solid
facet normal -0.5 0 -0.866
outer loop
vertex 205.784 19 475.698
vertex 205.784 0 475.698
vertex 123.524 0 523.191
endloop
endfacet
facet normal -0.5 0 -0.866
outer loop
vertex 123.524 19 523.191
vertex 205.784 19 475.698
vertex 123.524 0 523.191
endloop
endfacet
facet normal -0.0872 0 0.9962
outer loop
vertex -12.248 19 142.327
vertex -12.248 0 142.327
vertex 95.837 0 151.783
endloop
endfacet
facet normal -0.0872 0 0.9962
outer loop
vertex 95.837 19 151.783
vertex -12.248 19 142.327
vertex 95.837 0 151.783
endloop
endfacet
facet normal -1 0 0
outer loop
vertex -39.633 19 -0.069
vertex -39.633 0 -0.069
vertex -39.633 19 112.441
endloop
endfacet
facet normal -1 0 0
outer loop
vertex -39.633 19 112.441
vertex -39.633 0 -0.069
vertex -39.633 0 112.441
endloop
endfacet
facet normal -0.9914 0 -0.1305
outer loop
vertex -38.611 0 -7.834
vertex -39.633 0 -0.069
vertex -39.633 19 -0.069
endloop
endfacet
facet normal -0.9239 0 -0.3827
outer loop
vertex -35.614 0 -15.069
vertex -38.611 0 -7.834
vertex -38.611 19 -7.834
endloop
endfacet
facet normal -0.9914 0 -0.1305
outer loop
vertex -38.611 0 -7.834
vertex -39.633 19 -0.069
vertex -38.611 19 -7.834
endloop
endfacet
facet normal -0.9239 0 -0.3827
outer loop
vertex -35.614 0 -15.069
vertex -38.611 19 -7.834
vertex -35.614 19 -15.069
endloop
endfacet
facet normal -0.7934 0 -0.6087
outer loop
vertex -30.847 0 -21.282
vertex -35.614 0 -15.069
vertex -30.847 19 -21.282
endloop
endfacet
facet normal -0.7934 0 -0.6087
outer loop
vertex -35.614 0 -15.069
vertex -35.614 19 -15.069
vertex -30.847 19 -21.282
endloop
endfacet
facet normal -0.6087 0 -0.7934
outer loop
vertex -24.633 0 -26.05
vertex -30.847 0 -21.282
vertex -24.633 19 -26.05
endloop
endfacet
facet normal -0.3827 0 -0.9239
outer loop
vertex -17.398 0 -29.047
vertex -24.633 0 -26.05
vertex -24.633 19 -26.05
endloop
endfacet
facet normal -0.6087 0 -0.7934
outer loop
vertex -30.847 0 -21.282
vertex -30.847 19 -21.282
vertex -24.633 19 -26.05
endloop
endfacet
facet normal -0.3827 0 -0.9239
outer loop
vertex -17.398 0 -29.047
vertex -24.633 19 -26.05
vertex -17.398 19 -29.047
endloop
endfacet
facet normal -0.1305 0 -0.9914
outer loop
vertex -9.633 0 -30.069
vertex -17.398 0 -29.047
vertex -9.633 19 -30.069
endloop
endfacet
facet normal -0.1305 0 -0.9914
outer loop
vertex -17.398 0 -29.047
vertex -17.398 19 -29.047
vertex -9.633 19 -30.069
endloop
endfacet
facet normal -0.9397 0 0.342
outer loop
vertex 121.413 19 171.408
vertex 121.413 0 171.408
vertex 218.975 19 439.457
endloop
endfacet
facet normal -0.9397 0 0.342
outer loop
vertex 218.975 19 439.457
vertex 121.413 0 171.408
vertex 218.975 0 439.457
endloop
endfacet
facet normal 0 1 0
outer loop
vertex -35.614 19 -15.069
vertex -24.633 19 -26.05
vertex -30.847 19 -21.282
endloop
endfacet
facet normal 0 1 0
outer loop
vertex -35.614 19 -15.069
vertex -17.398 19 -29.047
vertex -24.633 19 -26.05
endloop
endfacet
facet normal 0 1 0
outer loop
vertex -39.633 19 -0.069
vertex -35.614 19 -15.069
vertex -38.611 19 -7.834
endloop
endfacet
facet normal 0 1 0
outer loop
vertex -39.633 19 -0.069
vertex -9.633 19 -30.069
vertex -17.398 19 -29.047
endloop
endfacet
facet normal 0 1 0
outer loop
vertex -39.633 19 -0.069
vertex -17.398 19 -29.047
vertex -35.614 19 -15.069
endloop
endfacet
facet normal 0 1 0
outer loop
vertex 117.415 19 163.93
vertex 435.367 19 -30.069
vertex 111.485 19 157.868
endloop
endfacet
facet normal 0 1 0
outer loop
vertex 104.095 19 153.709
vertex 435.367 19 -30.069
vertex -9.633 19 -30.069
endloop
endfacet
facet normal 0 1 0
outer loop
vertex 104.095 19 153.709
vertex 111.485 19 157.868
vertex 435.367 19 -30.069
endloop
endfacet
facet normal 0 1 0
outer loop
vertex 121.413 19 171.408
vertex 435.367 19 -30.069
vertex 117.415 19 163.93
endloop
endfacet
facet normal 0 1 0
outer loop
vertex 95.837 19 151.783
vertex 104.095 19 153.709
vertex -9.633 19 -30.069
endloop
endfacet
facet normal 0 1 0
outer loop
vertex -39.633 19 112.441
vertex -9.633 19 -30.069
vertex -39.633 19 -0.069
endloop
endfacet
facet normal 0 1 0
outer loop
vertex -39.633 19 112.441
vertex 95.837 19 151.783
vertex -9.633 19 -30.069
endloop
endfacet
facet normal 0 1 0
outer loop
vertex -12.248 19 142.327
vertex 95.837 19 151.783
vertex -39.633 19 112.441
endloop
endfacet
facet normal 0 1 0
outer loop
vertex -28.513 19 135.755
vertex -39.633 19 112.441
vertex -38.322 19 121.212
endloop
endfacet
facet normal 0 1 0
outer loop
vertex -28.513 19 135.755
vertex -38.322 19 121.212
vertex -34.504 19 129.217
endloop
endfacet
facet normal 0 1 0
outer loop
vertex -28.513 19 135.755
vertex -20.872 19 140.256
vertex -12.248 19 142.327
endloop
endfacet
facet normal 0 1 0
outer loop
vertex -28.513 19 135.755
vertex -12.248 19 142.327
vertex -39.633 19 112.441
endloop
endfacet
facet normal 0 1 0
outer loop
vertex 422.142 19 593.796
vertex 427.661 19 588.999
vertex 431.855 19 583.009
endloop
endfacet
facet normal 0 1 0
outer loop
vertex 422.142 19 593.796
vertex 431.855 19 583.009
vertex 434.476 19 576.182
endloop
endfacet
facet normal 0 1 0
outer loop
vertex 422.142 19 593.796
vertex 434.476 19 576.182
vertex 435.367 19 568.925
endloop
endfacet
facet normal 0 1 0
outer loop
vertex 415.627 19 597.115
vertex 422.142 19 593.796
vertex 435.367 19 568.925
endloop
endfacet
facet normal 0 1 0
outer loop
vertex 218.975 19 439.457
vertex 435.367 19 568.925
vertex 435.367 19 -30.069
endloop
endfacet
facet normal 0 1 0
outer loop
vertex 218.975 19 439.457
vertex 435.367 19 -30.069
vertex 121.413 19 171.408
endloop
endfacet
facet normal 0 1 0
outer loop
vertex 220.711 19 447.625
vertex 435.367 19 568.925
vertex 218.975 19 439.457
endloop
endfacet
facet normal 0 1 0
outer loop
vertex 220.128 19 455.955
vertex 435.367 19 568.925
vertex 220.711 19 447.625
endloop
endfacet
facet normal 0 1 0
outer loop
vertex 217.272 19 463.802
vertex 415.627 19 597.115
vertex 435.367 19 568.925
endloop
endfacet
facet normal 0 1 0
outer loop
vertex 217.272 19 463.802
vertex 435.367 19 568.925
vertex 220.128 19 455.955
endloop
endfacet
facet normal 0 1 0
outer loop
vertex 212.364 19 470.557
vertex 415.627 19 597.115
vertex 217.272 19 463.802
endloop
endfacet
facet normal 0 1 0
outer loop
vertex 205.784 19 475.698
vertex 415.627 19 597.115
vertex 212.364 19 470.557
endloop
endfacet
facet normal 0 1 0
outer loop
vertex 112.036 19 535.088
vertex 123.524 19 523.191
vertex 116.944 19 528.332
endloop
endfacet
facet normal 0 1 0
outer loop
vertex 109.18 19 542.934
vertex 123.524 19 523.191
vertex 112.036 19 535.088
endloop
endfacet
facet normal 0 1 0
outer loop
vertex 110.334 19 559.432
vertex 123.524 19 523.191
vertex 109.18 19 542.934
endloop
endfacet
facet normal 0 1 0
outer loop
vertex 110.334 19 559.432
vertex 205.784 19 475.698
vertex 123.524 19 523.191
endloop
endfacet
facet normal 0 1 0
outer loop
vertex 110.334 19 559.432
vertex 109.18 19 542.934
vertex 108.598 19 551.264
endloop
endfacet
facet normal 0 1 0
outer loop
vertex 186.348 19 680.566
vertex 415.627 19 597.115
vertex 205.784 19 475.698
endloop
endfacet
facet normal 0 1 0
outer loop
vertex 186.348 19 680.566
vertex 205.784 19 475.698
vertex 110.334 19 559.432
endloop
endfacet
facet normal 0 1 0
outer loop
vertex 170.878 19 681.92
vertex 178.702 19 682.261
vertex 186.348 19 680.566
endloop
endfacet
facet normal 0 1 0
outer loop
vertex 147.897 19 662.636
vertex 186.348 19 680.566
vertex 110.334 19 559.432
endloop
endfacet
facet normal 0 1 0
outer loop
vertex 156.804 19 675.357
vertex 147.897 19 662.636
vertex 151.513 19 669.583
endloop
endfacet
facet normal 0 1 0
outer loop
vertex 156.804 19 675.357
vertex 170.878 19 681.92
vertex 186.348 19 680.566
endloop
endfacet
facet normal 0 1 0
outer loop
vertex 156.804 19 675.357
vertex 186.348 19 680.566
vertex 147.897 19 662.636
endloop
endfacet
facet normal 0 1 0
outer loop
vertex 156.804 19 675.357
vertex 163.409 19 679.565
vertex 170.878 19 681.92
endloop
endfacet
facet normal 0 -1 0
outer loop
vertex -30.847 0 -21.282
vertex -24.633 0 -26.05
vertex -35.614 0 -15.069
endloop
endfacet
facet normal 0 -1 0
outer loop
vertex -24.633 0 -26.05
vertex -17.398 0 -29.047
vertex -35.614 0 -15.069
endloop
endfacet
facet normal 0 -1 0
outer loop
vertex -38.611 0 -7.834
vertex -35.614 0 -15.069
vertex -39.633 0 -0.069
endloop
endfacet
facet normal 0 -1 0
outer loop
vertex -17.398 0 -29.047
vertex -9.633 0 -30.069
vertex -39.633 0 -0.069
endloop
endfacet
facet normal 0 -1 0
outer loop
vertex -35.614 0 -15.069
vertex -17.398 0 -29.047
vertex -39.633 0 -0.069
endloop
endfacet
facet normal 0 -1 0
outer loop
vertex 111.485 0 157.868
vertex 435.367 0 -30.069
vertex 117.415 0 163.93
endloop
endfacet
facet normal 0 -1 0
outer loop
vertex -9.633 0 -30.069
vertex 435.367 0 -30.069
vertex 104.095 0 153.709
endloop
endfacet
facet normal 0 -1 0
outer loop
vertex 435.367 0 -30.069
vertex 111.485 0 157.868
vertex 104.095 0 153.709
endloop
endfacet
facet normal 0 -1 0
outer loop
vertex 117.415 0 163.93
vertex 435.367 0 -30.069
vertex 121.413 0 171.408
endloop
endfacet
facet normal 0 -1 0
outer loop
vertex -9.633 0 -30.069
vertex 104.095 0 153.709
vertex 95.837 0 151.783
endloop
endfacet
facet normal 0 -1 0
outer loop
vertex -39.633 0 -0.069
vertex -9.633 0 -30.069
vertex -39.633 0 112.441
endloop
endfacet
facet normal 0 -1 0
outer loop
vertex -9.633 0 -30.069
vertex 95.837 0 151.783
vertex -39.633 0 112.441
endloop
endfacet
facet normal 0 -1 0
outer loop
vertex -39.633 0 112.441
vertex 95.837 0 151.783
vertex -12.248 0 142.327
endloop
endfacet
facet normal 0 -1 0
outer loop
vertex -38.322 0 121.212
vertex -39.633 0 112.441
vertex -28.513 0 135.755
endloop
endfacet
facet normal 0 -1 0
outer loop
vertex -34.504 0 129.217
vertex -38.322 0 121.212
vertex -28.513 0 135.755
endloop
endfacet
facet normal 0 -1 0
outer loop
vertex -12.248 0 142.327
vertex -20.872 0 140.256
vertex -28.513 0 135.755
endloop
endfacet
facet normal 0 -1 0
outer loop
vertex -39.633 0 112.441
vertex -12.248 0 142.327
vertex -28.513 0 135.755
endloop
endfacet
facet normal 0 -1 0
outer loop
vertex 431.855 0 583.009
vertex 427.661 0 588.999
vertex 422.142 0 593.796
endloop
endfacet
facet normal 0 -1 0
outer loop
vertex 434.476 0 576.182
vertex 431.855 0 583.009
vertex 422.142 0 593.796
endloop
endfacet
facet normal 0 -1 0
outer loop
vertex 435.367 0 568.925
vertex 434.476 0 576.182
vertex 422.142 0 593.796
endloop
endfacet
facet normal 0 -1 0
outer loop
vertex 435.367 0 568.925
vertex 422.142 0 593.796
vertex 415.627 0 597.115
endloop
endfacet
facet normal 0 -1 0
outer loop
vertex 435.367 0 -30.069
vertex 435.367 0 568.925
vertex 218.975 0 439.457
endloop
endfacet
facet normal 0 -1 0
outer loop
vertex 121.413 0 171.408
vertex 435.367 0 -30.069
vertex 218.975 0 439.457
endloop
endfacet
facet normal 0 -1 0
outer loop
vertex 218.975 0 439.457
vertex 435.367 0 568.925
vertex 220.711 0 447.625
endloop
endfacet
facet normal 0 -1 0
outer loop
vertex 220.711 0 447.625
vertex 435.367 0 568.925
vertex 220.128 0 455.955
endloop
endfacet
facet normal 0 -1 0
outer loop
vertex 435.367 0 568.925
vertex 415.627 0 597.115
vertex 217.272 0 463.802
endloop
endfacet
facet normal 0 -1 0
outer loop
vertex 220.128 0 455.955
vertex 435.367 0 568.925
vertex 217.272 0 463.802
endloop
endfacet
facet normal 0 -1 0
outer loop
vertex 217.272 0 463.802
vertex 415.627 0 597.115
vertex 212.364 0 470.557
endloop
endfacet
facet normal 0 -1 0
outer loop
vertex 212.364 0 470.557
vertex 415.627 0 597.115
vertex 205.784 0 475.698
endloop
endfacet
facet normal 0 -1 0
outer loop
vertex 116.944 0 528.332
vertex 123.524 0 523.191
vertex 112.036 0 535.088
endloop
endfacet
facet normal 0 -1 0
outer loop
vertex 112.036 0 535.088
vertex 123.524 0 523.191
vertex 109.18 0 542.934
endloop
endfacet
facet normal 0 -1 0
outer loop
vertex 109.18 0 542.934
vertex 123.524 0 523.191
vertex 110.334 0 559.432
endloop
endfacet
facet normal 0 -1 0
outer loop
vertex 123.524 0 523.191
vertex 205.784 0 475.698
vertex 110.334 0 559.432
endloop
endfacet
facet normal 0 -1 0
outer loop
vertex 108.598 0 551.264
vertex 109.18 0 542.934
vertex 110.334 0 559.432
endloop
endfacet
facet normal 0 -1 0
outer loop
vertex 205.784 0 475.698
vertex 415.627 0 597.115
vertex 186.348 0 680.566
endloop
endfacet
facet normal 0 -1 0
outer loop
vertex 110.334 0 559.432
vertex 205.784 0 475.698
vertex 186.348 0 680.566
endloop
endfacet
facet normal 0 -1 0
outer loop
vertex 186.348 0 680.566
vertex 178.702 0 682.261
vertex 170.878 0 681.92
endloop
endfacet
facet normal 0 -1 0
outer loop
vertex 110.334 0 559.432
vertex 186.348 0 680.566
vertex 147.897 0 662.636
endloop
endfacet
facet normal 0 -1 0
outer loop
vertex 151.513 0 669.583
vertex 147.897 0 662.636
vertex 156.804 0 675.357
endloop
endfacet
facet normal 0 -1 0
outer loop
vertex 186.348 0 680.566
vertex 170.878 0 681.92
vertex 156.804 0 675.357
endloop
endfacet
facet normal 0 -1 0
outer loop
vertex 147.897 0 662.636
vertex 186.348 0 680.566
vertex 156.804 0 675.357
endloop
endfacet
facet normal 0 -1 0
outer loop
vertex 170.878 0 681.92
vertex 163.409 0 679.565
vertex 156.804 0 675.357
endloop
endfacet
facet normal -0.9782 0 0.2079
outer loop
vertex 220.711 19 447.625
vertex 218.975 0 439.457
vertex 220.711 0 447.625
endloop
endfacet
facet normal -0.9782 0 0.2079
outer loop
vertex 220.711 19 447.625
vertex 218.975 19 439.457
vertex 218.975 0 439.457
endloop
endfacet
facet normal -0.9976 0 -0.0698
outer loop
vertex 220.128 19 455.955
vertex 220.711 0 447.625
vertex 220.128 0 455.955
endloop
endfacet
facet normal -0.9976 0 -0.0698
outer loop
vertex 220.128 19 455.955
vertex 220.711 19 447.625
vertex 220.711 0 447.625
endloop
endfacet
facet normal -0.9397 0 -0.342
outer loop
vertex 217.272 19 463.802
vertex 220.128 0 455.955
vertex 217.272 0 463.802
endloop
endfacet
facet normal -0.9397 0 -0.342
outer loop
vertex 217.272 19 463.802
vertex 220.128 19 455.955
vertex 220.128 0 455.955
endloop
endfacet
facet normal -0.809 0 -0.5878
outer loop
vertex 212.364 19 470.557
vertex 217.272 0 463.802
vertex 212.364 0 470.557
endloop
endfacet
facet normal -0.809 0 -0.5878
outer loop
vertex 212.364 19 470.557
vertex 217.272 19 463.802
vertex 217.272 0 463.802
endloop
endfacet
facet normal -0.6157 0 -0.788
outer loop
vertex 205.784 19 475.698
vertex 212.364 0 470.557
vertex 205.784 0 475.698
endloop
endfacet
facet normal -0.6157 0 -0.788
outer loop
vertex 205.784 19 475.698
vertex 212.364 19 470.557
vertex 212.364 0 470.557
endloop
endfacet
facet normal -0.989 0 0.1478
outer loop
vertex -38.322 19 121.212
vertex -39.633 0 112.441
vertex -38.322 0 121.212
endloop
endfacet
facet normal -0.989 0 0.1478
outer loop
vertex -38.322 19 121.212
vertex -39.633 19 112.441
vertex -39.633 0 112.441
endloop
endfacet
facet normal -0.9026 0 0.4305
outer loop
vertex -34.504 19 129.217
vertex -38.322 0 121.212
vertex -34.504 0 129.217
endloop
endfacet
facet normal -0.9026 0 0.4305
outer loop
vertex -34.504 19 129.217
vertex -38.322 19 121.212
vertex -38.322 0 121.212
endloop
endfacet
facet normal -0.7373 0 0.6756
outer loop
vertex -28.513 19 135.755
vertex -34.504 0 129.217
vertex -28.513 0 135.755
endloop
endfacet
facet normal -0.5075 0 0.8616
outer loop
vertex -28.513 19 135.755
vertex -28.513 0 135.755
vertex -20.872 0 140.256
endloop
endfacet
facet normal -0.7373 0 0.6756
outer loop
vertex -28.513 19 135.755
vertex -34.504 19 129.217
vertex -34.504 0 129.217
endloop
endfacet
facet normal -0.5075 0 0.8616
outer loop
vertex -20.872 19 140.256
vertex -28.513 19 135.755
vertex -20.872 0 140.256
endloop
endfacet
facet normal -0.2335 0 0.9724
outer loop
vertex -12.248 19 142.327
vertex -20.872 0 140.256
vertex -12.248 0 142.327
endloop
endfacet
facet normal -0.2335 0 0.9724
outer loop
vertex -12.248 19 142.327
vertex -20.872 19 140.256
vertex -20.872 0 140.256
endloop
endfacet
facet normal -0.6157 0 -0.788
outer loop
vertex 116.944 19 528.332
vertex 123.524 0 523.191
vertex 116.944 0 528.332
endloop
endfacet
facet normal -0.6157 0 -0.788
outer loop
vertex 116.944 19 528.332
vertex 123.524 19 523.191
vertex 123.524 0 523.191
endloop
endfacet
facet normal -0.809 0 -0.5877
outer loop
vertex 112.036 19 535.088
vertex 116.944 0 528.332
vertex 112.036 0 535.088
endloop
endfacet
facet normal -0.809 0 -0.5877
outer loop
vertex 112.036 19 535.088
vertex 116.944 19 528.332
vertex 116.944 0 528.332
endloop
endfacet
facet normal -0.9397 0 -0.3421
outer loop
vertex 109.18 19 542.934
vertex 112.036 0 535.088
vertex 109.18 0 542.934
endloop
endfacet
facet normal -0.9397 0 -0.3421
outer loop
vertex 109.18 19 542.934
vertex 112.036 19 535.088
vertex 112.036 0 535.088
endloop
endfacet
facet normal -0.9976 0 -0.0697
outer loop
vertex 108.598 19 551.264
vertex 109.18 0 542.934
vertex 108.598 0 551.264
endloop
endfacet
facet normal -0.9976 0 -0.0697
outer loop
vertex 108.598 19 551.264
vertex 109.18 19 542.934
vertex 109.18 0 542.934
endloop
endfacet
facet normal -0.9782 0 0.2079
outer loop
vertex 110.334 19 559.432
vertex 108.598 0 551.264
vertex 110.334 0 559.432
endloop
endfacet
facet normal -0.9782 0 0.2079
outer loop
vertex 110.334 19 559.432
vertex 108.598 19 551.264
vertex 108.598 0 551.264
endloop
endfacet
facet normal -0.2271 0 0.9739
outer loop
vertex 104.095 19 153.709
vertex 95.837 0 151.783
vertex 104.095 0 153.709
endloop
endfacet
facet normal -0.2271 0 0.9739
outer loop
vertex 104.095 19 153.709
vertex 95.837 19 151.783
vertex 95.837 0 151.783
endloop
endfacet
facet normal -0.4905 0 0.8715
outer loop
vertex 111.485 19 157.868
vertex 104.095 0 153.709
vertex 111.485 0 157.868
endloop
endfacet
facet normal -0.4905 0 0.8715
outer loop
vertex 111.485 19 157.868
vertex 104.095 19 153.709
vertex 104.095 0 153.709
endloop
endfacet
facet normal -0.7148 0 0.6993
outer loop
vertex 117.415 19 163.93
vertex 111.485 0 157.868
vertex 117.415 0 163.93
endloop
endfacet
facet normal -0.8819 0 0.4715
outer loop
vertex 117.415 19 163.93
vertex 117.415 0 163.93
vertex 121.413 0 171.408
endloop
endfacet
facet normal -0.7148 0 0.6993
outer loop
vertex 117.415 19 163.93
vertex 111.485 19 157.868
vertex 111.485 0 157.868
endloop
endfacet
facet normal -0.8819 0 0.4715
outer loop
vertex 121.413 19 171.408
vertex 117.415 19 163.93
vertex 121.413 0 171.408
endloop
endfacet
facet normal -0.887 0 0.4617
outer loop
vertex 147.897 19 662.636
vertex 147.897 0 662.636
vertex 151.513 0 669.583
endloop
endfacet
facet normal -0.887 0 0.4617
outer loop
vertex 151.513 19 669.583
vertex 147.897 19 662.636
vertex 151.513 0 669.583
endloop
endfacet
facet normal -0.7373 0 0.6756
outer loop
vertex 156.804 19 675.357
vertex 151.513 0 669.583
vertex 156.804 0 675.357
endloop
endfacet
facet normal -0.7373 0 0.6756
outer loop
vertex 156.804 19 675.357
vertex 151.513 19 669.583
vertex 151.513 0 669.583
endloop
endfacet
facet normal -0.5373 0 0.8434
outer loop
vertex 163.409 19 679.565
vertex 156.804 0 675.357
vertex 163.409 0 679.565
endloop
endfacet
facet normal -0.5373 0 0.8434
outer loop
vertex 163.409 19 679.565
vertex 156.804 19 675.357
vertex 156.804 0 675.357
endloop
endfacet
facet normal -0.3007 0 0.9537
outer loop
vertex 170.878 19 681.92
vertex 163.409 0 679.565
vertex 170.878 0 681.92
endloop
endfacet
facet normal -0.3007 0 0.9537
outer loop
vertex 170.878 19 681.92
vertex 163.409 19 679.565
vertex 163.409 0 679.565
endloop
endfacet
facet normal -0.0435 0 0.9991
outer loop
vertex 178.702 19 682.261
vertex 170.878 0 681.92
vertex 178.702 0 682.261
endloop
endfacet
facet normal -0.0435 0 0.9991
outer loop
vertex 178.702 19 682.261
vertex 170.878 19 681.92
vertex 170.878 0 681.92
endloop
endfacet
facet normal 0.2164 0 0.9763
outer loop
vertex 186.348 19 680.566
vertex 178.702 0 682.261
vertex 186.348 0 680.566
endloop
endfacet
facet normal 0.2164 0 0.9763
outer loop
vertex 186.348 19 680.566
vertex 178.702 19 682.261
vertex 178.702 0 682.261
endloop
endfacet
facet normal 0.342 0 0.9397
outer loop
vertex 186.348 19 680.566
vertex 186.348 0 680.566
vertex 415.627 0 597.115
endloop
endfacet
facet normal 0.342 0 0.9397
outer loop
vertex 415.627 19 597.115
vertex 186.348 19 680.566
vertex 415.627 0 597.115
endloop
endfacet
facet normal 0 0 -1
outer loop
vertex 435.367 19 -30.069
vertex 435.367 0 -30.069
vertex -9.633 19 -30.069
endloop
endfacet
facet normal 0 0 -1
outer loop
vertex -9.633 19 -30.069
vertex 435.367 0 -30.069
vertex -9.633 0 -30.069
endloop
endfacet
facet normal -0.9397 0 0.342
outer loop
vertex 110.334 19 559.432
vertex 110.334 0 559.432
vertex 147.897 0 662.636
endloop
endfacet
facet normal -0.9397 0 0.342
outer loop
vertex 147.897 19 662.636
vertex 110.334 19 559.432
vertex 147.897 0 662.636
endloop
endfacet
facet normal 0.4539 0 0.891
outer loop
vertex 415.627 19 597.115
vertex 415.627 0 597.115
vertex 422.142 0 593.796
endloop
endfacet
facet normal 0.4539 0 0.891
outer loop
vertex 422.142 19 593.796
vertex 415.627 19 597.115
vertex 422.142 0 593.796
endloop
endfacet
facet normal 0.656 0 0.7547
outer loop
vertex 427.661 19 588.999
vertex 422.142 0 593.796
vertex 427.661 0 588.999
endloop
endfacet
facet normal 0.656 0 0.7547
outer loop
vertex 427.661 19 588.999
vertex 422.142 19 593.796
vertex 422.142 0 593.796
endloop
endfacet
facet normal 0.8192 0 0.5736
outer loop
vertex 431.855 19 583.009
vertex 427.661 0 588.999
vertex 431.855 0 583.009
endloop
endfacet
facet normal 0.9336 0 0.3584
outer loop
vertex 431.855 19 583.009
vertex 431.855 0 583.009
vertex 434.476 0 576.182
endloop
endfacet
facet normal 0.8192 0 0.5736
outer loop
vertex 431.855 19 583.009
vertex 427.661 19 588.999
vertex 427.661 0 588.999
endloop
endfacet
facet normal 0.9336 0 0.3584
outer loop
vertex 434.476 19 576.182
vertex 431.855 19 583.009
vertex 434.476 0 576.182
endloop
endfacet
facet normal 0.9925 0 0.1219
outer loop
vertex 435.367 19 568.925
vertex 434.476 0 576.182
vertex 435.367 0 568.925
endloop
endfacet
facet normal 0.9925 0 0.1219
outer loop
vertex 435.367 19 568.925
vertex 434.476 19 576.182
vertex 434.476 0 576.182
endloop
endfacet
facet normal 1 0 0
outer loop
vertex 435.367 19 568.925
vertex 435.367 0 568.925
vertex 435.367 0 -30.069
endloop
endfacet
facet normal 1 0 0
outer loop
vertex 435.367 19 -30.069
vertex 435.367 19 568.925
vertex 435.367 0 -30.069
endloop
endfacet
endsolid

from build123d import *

# Parameters (mm, degrees)
PAD_DEPTH = 19
FILLET_R  = 30


with BuildPart() as part:
    # Sketch001 → Pad (new body)
    with BuildSketch(Plane.XZ):
        Polygon((-39.633348, -30.069131), (-39.633348, 139.930869), (114.876213, 153.448704), (227.584428, 463.11198), (101.724005, 535.777529), (158.157329, 690.826811), (435.366652, 589.930869), (435.366652, -30.069131), align=None)
    extrude(amount=-PAD_DEPTH)

    # Fillet
    fillet_edges = [part.edges().sort_by_distance(p)[0] for p in [
        (-39.633348, 9.5, -30.069131),
        (-39.633348, 9.5, 139.930869),
        (101.724005, 9.5, 535.777529),
        (158.157329, 9.5, 690.826811),
        (435.366652, 9.5, 589.930869),
        (227.584428, 9.5, 463.11198),
        (114.876213, 9.5, 153.448704),
    ]]
    fillet(fillet_edges, radius=FILLET_R)


solid = part.part
